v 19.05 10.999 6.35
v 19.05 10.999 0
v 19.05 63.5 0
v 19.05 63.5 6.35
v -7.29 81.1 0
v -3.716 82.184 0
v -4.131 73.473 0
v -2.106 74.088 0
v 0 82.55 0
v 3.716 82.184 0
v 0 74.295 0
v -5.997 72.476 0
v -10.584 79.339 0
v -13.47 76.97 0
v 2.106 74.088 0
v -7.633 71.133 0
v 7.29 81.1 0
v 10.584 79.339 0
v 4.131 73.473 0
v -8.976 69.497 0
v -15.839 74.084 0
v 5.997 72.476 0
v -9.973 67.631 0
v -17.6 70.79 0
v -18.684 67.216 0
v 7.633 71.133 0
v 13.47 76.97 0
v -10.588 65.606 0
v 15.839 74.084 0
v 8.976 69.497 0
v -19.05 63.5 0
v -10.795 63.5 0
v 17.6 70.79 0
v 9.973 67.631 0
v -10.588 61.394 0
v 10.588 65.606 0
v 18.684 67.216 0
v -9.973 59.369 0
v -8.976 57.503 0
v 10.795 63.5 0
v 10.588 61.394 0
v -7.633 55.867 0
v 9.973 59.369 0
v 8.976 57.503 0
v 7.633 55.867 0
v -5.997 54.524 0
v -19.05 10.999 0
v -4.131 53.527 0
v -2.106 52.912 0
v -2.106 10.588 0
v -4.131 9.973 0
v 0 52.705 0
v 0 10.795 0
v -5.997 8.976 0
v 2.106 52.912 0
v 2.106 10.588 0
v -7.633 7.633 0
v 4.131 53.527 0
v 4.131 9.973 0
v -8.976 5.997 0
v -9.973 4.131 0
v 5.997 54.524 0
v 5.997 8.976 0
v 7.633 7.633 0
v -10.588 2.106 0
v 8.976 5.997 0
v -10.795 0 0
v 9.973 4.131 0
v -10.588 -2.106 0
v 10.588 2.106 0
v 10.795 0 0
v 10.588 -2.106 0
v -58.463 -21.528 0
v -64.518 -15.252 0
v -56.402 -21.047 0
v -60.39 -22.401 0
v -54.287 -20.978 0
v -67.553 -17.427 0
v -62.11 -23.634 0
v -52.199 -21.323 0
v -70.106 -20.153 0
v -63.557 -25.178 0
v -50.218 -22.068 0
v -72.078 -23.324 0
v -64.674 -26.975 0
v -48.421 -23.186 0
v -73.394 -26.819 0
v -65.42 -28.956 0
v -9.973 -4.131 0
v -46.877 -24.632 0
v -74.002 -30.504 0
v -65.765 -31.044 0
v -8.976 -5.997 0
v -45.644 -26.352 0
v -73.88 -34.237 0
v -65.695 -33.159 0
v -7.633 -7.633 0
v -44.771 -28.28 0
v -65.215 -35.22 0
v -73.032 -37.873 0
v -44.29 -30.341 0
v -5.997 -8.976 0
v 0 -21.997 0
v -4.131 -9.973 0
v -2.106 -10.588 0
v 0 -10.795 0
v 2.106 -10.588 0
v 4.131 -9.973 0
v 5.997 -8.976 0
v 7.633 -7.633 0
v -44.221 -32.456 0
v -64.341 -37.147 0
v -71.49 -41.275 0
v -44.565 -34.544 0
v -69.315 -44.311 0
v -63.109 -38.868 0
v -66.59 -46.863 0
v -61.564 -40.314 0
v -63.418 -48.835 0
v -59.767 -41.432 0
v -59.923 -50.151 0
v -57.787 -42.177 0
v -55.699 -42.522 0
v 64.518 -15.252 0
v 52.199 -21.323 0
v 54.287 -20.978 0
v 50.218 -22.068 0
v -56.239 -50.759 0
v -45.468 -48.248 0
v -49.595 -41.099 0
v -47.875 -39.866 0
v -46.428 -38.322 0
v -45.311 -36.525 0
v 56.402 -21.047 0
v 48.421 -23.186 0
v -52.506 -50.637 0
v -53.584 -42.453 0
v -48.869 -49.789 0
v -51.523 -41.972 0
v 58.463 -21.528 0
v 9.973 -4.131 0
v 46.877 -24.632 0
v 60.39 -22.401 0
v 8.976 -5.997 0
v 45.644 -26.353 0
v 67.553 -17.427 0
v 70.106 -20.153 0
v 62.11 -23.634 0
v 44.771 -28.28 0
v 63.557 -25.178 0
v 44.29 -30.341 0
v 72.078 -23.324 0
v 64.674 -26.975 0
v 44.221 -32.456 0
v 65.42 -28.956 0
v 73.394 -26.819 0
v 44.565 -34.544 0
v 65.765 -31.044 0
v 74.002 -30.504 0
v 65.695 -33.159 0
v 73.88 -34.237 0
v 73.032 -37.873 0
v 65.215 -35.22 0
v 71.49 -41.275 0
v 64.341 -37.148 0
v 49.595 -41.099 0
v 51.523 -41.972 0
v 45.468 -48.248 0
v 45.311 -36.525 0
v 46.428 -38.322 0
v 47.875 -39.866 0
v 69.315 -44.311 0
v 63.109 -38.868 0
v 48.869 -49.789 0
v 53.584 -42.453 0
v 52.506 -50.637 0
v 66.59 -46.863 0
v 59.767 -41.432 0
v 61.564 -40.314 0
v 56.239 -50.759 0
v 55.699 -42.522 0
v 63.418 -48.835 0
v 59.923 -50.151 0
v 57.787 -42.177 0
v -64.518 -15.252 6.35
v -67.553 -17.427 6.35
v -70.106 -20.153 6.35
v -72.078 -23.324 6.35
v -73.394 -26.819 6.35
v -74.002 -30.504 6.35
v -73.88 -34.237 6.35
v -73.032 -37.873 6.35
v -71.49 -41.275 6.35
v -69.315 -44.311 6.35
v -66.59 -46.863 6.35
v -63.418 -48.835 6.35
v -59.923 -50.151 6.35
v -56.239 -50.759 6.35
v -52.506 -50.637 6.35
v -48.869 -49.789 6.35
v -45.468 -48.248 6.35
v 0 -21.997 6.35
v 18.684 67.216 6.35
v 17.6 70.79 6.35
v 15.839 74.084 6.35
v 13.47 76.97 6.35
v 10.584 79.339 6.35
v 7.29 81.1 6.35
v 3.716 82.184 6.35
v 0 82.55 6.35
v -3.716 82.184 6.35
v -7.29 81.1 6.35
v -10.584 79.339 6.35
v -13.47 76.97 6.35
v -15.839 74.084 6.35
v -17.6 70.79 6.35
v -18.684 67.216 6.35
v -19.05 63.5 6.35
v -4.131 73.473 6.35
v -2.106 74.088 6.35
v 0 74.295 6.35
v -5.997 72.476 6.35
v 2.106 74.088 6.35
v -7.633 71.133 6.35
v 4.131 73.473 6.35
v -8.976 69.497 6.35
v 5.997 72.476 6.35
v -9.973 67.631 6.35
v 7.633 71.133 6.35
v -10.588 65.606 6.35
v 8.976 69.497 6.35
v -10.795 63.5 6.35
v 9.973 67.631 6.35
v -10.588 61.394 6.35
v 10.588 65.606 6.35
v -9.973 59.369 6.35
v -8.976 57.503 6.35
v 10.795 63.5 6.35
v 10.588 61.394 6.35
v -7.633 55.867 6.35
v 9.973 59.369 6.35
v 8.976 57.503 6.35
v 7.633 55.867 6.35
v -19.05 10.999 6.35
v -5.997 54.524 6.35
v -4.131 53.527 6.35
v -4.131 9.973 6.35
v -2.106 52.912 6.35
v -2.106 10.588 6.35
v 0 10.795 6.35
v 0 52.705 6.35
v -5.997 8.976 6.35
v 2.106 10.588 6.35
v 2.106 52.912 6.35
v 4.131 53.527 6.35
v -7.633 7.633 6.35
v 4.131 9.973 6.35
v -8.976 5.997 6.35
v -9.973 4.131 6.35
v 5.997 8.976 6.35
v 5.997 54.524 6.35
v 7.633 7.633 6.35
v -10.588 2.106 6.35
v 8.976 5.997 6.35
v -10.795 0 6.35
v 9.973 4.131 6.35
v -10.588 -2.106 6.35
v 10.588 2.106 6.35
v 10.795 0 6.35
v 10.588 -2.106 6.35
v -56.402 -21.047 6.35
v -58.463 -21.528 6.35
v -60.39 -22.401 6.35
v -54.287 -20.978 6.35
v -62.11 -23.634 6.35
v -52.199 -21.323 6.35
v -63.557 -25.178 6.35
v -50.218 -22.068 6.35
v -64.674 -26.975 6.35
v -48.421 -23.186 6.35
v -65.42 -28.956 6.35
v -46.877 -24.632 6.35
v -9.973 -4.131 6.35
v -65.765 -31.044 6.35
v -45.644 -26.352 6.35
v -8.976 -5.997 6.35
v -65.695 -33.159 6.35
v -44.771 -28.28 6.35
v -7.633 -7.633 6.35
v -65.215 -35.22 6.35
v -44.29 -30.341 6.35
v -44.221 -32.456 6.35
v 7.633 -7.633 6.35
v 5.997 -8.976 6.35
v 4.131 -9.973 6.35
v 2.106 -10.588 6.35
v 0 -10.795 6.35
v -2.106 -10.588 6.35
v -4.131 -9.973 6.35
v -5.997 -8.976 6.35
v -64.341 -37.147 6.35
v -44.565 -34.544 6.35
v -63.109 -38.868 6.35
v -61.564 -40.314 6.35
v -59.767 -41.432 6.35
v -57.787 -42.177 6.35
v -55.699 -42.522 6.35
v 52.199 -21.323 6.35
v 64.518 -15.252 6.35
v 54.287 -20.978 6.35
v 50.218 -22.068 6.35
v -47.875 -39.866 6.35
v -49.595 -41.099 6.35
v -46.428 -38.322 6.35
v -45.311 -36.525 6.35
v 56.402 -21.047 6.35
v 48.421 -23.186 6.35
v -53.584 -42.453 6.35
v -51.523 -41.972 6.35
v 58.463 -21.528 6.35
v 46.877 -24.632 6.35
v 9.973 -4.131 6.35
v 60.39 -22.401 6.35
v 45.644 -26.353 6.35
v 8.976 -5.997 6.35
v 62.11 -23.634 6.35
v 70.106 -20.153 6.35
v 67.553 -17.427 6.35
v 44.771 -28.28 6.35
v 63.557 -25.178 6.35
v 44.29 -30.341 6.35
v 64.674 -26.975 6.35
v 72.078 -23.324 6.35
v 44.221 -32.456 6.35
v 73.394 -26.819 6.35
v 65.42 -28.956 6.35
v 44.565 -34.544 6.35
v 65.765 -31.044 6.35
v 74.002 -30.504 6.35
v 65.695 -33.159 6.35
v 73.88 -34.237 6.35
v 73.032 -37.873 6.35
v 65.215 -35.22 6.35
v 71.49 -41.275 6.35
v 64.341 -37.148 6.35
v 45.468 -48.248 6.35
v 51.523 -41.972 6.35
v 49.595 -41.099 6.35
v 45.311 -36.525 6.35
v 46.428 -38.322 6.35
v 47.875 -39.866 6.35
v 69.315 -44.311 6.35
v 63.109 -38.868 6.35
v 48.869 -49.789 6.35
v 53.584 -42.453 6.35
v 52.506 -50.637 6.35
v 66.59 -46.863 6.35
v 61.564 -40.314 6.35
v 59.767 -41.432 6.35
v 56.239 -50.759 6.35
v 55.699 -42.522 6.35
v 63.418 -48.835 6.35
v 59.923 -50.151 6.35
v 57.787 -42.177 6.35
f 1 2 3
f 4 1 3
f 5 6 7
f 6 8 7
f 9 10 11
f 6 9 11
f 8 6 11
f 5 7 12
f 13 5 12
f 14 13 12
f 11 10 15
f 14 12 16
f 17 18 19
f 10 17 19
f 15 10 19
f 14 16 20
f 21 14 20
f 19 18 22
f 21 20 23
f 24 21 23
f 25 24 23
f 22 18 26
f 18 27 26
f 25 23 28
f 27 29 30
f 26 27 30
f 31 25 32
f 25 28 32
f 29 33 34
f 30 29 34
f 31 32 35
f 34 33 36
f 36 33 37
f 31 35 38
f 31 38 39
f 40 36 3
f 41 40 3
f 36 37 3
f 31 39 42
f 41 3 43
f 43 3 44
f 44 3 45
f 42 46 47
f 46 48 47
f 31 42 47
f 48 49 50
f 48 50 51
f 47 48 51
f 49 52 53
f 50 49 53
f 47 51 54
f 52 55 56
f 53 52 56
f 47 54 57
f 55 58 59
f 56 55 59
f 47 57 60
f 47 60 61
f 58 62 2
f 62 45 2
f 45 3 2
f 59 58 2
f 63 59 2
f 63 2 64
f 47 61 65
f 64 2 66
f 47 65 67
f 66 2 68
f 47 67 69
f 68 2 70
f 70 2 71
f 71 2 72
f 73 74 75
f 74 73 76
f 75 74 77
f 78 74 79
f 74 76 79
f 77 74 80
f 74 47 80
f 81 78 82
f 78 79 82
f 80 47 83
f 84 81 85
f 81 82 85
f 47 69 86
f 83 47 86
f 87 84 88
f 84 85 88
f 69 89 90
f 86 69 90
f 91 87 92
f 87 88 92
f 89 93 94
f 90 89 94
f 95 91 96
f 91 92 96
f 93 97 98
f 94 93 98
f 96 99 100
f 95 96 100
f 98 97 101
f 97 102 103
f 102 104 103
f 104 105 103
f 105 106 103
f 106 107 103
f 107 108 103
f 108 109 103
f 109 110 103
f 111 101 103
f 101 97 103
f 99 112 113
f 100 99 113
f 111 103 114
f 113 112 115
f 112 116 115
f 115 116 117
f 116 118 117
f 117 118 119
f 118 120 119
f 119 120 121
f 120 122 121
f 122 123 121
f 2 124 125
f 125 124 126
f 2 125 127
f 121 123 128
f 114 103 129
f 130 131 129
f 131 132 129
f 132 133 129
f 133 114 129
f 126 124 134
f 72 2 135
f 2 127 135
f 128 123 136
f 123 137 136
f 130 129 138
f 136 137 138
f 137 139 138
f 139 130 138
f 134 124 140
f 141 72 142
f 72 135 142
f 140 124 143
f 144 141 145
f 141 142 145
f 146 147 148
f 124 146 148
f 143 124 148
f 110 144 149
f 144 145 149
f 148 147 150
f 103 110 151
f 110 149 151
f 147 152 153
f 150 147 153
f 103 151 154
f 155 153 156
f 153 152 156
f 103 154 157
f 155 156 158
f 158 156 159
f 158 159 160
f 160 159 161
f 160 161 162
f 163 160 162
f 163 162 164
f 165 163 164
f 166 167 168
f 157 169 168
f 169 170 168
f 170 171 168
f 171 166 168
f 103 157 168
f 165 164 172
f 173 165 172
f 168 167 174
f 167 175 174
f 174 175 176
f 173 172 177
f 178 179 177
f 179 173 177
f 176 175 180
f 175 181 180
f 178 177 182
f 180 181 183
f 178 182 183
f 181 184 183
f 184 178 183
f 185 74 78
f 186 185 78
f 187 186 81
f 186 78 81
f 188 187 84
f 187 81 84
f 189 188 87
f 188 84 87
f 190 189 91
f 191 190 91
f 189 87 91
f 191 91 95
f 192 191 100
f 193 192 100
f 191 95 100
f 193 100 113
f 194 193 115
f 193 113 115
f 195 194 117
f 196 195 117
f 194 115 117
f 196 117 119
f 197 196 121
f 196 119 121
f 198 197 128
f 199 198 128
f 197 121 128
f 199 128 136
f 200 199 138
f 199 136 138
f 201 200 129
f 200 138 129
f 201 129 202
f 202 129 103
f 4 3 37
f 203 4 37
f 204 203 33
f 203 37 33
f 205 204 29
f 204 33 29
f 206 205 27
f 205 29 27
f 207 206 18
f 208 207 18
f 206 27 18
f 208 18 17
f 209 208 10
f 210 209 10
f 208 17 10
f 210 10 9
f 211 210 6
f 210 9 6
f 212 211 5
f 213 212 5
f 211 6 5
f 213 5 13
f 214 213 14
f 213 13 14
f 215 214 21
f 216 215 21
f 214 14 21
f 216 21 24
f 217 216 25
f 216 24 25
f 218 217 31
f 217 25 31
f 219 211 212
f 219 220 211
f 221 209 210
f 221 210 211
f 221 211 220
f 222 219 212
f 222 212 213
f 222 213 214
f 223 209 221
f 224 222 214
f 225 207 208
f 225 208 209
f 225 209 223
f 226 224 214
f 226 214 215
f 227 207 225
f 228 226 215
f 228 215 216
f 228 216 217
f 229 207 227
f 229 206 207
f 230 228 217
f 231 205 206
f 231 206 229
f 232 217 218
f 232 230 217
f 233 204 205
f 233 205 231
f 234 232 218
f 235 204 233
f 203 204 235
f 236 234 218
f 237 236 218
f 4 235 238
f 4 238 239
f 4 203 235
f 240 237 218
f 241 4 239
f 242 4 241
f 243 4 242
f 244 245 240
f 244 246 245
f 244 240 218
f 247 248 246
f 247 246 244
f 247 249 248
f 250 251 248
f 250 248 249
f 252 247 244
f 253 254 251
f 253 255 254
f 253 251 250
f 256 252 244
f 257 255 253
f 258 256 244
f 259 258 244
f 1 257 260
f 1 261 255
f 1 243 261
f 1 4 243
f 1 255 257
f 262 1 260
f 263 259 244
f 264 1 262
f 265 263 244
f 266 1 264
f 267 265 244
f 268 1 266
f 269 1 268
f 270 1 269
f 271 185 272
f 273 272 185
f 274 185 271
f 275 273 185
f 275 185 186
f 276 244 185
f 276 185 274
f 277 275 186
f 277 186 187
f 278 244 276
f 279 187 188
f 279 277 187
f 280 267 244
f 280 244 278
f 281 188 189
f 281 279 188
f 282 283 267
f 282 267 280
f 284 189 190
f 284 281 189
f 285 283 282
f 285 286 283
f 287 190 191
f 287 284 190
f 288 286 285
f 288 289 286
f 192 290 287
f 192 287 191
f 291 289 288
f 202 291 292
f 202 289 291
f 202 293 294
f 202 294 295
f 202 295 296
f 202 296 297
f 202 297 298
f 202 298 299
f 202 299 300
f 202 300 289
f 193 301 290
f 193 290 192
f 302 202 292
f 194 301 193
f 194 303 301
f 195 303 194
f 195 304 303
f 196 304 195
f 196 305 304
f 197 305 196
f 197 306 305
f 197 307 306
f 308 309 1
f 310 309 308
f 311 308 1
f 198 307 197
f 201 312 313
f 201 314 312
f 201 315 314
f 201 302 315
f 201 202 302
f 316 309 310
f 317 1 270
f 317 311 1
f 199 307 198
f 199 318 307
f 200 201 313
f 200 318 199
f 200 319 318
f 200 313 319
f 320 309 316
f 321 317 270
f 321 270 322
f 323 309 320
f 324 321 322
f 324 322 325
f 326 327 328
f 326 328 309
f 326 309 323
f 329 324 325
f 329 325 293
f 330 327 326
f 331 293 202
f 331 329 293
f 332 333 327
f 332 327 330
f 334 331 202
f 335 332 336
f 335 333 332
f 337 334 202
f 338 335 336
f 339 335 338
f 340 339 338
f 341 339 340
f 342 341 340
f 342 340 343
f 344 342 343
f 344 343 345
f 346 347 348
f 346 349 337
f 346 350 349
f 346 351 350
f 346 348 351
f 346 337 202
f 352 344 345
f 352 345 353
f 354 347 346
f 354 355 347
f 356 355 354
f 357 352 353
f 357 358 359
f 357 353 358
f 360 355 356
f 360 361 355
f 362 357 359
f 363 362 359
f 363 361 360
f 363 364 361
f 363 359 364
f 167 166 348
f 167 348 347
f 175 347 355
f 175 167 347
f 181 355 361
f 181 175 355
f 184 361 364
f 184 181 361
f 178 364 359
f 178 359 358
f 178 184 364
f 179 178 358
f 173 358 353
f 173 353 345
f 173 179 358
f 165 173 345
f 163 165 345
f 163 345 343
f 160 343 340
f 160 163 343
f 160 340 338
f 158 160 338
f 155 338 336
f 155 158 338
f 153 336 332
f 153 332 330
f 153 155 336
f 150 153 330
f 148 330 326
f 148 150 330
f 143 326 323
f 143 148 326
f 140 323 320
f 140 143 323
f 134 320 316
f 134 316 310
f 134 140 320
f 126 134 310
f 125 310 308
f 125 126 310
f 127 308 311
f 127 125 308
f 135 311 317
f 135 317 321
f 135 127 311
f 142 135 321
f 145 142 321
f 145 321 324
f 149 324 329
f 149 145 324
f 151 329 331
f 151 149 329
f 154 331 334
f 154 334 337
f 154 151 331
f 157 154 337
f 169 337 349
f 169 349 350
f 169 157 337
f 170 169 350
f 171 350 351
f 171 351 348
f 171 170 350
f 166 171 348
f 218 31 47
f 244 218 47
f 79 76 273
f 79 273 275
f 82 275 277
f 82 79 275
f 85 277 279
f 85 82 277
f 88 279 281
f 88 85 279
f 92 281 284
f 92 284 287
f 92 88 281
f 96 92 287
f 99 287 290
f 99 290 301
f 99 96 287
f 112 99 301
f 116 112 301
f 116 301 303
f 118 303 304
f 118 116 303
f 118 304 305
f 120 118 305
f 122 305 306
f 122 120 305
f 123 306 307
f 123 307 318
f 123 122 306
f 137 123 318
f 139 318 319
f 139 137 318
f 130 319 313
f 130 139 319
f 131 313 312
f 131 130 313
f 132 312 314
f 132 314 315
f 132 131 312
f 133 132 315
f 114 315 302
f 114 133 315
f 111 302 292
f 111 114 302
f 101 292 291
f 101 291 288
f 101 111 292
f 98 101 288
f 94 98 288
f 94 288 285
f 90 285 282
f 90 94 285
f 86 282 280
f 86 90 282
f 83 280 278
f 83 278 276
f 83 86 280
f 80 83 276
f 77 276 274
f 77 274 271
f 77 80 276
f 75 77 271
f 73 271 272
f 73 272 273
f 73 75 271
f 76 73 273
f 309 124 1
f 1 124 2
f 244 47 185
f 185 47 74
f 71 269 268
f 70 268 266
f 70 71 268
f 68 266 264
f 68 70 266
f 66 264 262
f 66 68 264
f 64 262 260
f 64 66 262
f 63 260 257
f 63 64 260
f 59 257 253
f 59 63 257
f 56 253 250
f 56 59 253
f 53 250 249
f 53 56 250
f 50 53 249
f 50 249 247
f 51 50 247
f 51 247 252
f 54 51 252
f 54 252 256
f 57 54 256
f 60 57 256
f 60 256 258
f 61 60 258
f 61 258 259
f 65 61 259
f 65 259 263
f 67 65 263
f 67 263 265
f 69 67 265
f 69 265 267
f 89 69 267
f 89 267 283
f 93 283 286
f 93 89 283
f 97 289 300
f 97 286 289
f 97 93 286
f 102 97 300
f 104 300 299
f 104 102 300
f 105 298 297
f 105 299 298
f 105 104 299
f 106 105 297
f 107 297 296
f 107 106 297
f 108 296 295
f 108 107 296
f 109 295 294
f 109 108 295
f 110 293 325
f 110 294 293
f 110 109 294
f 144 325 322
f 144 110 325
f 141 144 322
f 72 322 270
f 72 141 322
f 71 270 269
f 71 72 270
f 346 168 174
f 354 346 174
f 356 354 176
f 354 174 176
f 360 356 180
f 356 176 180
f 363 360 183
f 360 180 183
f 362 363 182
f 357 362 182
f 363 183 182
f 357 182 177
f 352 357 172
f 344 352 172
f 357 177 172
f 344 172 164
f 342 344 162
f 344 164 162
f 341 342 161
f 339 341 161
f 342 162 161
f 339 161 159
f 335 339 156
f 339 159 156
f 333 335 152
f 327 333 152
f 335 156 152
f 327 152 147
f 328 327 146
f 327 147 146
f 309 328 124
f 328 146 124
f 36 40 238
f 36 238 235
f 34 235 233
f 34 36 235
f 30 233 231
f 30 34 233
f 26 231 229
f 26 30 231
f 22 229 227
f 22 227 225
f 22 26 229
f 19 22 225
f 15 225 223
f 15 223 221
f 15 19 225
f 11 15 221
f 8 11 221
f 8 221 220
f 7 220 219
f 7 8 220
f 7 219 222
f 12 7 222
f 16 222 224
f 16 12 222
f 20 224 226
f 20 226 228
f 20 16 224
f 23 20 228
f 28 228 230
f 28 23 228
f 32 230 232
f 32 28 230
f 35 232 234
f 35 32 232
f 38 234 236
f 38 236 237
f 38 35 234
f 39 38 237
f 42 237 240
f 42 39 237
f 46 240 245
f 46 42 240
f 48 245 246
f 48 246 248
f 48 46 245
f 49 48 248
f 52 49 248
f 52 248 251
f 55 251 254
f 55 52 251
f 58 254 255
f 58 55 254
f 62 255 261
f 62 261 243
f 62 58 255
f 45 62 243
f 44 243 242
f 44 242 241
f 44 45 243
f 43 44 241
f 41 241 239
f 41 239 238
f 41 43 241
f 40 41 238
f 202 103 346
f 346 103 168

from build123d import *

# Parameters (mm, degrees)
F0_R            = 10.795
F1_DEPTH        = 6.35
F1_COPIES_COUNT = 3


# Not quite as in the source:
# - a pattern or mirror of a feature is missing from the dataset's text; its kind, count and spacing are read off the source's solid


with BuildPart() as f1:
    # F0 (on Top) → F1 (new body)
    with BuildSketch(Plane.XY):
        with BuildLine():
            Line((-19.05, 63.5), (-19.05, 0))
            ThreePointArc((-19.05, 0), (0, -19.05), (19.05, 0))
            Line((19.05, 0), (19.05, 63.5))
            ThreePointArc((19.05, 63.5), (0, 82.55), (-19.05, 63.5))
        make_face()
        Circle(F0_R, mode=Mode.SUBTRACT)
        with Locations((0, 63.5)):
            Circle(F0_R, mode=Mode.SUBTRACT)
    extrude(amount=F1_DEPTH)

    # F1_copies: F1 ×3 about axis
    f1_copies_axis = Axis((0, 0, 0), (0, 0, 1))


with BuildPart() as f1_1:
    add(f1.part)
    for i in range(1, F1_COPIES_COUNT):
        add(f1.part.rotate(f1_copies_axis, i * 360 / F1_COPIES_COUNT))


solid = f1_1.part
